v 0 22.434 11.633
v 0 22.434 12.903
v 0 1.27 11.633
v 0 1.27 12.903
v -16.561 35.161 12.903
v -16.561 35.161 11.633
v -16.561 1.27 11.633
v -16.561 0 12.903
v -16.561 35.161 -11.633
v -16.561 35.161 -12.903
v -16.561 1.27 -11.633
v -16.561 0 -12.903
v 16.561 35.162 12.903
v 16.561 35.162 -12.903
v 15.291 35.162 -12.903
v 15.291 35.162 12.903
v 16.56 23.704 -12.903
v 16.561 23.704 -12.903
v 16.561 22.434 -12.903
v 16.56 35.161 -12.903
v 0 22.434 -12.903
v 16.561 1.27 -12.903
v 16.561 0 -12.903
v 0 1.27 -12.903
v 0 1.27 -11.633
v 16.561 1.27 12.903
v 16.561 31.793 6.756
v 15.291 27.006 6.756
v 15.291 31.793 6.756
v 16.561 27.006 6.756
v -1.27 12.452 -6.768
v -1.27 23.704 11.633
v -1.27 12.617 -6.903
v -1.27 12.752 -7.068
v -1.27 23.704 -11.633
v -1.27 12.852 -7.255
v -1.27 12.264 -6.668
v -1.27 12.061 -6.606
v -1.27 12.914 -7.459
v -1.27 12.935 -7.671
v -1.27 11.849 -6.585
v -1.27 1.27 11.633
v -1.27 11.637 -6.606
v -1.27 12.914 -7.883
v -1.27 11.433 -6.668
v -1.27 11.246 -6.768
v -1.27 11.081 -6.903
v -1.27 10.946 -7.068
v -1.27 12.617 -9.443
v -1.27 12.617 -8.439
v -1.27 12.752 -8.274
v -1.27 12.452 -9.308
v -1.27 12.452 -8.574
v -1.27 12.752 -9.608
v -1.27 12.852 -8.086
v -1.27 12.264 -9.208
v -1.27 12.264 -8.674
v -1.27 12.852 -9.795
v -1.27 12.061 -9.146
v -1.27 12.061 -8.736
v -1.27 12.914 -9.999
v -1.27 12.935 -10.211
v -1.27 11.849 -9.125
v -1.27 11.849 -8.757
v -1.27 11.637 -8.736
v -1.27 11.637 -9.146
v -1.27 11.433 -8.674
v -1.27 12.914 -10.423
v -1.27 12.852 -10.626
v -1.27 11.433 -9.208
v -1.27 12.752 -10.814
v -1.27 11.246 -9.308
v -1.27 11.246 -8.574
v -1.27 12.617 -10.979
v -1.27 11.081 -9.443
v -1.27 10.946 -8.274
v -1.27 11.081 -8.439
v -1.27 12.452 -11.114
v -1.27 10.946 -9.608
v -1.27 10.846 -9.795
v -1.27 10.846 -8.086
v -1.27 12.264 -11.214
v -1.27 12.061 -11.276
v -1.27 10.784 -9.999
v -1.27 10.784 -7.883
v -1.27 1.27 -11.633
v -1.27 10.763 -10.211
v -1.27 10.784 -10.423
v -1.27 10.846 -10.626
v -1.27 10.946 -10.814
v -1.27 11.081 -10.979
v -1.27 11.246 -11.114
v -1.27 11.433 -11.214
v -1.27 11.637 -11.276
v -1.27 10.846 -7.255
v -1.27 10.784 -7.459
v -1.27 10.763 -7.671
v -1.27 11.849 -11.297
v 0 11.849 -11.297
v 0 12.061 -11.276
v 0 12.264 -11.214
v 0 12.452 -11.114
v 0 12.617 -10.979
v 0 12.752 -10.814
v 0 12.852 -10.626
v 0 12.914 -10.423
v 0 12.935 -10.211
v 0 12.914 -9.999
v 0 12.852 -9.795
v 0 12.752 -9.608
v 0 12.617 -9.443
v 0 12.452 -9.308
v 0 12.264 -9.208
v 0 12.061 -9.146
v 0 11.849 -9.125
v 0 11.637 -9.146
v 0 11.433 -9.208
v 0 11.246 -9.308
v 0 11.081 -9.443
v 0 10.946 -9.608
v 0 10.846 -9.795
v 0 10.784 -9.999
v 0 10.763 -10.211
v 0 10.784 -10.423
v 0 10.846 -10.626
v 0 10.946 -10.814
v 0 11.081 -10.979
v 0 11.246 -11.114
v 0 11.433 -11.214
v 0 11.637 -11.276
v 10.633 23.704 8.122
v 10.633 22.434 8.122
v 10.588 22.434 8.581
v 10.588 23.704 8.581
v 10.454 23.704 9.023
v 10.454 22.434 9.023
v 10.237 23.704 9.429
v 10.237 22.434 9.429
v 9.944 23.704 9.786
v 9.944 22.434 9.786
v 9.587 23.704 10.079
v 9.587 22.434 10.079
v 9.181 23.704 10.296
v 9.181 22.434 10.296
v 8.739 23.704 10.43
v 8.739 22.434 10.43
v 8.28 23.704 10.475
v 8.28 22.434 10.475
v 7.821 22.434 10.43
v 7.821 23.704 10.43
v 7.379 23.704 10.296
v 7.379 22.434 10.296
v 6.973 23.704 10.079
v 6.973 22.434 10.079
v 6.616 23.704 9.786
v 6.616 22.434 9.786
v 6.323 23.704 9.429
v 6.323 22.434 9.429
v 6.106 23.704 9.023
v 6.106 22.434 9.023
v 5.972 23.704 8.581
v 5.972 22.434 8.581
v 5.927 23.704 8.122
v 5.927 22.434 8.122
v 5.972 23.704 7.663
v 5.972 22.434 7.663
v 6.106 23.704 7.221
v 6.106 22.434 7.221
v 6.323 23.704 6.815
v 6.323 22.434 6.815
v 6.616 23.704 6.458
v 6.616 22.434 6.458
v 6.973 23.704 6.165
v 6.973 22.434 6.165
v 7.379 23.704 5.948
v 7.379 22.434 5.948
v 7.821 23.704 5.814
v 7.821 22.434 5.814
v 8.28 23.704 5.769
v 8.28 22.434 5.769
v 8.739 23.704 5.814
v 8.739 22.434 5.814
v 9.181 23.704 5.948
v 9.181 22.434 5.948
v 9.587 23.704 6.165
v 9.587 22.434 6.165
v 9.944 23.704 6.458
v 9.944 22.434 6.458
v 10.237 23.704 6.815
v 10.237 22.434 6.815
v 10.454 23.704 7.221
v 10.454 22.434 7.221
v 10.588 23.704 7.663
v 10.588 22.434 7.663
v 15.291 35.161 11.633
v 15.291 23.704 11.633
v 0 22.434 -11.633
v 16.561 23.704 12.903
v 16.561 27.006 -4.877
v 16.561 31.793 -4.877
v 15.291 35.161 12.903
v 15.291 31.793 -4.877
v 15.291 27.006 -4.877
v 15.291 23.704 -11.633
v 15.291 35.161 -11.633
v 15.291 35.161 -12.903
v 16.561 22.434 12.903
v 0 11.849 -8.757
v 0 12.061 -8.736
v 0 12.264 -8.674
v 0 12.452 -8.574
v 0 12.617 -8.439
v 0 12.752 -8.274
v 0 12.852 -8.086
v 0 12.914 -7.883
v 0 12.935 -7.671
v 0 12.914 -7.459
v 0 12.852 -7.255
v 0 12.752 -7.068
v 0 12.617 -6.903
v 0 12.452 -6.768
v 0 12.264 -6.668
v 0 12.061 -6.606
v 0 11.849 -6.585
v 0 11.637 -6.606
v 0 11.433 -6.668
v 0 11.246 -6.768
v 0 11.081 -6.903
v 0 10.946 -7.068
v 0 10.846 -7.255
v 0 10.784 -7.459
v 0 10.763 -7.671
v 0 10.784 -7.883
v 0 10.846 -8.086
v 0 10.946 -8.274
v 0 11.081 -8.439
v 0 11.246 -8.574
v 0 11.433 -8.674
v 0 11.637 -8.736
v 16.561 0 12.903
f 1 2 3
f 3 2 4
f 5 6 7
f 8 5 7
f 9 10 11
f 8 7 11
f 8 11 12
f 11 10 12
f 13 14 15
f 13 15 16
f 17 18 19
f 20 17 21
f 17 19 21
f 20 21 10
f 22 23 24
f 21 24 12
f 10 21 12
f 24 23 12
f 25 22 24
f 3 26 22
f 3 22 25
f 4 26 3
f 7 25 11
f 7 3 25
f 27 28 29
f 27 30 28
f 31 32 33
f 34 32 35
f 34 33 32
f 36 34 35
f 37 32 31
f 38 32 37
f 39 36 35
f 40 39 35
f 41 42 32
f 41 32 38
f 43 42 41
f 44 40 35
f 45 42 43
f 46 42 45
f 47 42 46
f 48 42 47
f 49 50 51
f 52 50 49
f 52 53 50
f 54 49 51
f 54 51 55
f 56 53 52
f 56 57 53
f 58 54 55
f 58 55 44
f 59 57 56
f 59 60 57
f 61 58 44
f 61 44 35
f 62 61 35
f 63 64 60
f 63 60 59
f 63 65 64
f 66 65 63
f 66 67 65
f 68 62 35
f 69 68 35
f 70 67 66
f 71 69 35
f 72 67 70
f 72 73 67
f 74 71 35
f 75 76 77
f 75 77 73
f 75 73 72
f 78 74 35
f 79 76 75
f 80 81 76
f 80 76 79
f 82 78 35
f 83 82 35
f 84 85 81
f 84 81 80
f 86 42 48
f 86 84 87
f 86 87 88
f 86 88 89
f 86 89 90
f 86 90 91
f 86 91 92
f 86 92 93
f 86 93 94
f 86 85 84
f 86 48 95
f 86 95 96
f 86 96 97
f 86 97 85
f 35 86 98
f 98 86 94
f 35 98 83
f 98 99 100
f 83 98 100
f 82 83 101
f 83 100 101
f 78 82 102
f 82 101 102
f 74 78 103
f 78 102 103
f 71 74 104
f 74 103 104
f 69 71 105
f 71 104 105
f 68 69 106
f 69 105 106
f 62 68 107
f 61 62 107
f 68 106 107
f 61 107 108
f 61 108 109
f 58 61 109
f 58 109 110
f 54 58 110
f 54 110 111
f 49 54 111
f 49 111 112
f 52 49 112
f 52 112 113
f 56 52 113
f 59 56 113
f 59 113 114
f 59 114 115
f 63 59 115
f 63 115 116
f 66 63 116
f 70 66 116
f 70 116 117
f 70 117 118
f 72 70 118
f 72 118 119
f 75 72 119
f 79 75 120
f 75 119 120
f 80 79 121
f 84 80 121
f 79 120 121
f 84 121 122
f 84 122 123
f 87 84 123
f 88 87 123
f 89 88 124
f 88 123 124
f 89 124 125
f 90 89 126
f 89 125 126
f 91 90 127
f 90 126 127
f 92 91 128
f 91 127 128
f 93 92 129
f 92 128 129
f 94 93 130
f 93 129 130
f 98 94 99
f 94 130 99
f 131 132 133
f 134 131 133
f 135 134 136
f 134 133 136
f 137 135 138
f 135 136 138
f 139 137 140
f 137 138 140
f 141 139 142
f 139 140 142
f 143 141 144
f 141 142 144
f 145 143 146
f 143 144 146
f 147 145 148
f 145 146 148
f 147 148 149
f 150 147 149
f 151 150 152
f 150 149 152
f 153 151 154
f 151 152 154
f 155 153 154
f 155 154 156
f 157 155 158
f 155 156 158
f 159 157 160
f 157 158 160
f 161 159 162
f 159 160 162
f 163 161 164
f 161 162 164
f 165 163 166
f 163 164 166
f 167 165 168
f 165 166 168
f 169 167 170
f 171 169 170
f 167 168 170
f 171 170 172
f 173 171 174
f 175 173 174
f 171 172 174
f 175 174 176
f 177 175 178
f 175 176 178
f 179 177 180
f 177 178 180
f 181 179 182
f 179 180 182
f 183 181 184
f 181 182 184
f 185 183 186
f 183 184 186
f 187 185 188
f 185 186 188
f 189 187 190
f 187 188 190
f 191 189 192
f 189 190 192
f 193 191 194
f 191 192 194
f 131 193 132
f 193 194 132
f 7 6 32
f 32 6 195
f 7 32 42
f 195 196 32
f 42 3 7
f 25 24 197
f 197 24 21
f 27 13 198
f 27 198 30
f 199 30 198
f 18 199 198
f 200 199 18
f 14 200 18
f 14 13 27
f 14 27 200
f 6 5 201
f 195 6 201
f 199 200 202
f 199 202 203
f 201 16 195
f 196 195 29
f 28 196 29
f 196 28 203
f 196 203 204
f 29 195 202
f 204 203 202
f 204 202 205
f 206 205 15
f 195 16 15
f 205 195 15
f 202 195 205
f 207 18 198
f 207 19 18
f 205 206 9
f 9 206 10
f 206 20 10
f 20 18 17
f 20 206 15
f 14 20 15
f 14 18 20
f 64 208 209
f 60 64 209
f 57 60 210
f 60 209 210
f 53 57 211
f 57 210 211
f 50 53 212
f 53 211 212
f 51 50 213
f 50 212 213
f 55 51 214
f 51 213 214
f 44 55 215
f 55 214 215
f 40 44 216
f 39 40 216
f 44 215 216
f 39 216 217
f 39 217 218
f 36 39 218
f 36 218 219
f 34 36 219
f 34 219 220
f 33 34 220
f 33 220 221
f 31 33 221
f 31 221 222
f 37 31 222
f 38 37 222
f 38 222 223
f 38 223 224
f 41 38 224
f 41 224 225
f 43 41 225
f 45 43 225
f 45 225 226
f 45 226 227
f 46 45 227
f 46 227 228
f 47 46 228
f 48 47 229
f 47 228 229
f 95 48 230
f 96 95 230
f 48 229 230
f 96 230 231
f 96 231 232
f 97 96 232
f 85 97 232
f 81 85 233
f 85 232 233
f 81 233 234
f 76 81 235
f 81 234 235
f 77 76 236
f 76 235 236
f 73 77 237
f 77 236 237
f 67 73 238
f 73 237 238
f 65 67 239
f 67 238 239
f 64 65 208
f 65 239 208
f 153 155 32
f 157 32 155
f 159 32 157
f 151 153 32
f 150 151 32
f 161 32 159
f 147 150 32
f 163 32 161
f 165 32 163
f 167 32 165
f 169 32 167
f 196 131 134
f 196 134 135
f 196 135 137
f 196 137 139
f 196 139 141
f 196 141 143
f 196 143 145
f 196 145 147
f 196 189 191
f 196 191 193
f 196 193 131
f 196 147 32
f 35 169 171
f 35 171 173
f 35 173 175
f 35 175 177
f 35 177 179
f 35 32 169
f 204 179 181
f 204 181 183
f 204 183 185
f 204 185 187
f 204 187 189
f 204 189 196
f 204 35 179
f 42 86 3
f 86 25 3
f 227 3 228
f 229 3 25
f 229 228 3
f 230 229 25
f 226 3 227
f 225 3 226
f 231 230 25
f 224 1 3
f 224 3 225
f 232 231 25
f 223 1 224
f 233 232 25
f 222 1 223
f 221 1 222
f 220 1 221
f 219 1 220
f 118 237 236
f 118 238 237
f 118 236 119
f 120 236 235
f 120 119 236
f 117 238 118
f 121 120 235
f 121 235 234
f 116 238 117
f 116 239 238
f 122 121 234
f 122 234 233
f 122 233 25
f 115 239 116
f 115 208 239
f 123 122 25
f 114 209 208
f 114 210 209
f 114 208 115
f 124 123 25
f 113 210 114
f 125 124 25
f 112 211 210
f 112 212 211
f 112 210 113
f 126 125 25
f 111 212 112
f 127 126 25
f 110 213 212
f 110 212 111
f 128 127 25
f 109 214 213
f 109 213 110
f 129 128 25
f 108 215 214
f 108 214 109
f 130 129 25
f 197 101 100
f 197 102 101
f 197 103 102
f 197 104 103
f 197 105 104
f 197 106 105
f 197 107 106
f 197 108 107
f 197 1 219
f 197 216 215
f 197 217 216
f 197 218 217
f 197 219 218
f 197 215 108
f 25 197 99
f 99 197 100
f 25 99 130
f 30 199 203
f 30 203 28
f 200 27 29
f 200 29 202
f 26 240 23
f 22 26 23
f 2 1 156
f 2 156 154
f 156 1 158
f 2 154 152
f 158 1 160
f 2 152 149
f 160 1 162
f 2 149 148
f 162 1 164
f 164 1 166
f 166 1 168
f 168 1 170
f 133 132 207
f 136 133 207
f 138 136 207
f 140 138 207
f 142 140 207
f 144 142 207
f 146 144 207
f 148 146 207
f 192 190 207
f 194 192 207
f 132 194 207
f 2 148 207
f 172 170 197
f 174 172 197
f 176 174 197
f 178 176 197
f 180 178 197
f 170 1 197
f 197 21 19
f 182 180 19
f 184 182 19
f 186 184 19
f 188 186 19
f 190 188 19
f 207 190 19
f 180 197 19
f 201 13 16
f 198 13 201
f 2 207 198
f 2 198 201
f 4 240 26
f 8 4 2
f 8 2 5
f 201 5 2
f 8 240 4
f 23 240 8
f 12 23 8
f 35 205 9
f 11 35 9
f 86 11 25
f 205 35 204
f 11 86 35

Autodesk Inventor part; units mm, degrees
ref_plane "YZ Plane" through (0, 0, 0) normal (1, 0, 0) x (0, 1, 0)
ref_plane "XZ Plane" through (0, 0, 0) normal (0, 1, 0) x (-1, 0, 0)
ref_plane "XY Plane" through (0, 0, 0) normal (0, 0, 1) x (1, 0, 0)
sketch "Boceto1" plane through (0, 0, 0) normal (0, 1, 0) x (-1, 0, 0)
  line L0 (-16.5612, -12.9032) -> (16.5612, -12.9032)
  line L1 (16.5612, -12.9032) -> (16.5612, 12.9032)
  line L2 (16.5612, 12.9032) -> (-16.5612, 12.9032)
  line L3 (-16.5612, 12.9032) -> (-16.5612, -12.9032)
  line L4 (-16.5612, -12.9032) -> (16.5612, 12.9032) construction
  line L5 (16.5612, -12.9032) -> (-16.5612, 12.9032) construction
  point P0 (0, 0)
  dimension "d0" = 16.5612
  dimension "d1" = 12.9032
extrude "Extrusión1" add sketch "Boceto1" along normal blind 1.27
sketch "Boceto2" plane through (-16.5612, 0, 12.9032) normal (0, 0, 1) x (1, 0, 0)
  line L0 (0, 1.27) -> (0, 35.1613)
  line L1 (0, 35.1613) -> (33.1216, 35.1613)
  line L2 (33.1216, 35.1613) -> (33.1216, 22.4613)
  line L3 (33.1216, 22.4613) -> (16.5608, 22.4613)
  line L4 (16.5608, 22.4613) -> (16.5612, 1.27)
  line L5 (33.1224, 1.27) -> (0, 1.27) projected
  point P0 (16.5612, 0)
  dimension "d4" = 33.1216
  dimension "d5" = 12.7
  dimension "d6" = 16.5608
  dimension "d7" = 21.1913
extrude "Extrusión2" add sketch "Boceto2" against normal blind 1.27
mirror "Simetría1" about plane through (0, 0, 0) normal (0, 0, 1) of "Extrusión2"
sketch "Boceto3" plane through (-0.0004, 22.4613, -11.6332) normal (1, 0, 0) x (0, 0, -1)
  line L0 (0, -21.191) -> (-23.2664, -21.191) projected
  line L1 (-23.2664, -21.191) -> (-23.2664, -0.0276)
  line L2 (-23.2664, -0.0276) -> (0, -0.0276)
  line L3 (0, 0) -> (0, -21.1913) projected
  line L4 (0, -0.0276) -> (0, -21.1913)
  line L5 (0, -21.1913) -> (-23.2664, -21.191)
  point P0 (-11.6332, -22.4613)
  dimension "d10" = 21.1634
extrude "Extrusión3" add sketch "Boceto3" against normal blind 1.27
sketch "Boceto4" plane through (-0.0004, 22.4337, 11.6332) normal (0, 1, 0) x (1, 0, 0)
  line L0 (16.561, 23.2664) -> (16.5608, 23.2664) projected
  line L1 (16.561, -1.27) -> (-1.2701, -1.27)
  line L2 (-1.27, 0) -> (-1.27, 23.2664) projected
  line L3 (-1.2701, -1.27) -> (-1.2701, 24.5364)
  line L4 (16.5612, 24.5364) -> (-16.5612, 24.5364) projected
  line L5 (-1.2701, 24.5364) -> (16.5612, 24.5364)
  line L6 (16.5612, 24.5364) -> (16.561, -1.27)
  dimension "d23" = 17.8312
extrude "Extrusión4" add sketch "Boceto4" along normal blind 1.27
sketch "Boceto7" plane through (16.5606, 22.434, 12.9032) normal (1, 0, 0) x (0, 0, -1)
  line L0 (0, 0) -> (25.8062, 0)
  line L1 (25.8062, -22.4334) -> (25.8062, 12.7279) projected
  line L2 (25.8062, 12.7279) -> (0, 12.7279)
  line L3 (0, 12.7279) -> (0, 0)
  line L4 (0, 1.27) -> (25.8064, 1.27) projected
  dimension "d28" = 1.27
  dimension "d29" = 25.8062
extrude "Extrusión7" add sketch "Boceto7" against normal blind 1.27
sketch "Boceto8" plane through (16.5606, 22.434, 12.9032) normal (1, 0, 0) x (0, 0, -1)
  line L0 (6.1467, 9.3592) -> (17.78, 9.3592)
  line L1 (17.78, 9.3592) -> (17.78, 4.572)
  line L2 (17.78, 4.572) -> (6.1467, 4.572)
  line L3 (6.1467, 4.572) -> (6.1467, 9.3592)
  line L4 (25.8064, 0) -> (0, 0) projected
  line L5 (0, 12.7273) -> (0, 1.27) projected
  point P0 (12.9031, -22.4337)
  dimension "d30" = 4.7871
  dimension "d31" = 11.6333
  dimension "d36" = 4.572
  dimension "d37" = 17.78
extrude "Extrusión8" cut sketch "Boceto8" against normal up to next
sketch "Boceto9" plane through (-0.0004, 22.4337, 11.6332) normal (0, -1, 0) x (1, 0, 0)
  circle A0 centre (8.2804, -3.5112) radius 2.3532
  line L0 (0, -24.5364) -> (0, 1.27) projected
  line L1 (15.291, 0) -> (-1.2701, 0) projected
  point P0 (0, -11.6332)
  dimension "d42" = 4.7064
  dimension "d43" = 8.2804
  dimension "d44" = 3.5112
extrude "Extrusión9" cut sketch "Boceto9" against normal up to next
sketch "Boceto10" plane through (0, 1.27, 12.9032) normal (1, 0, 0) x (0, 0, -1)
  circle A0 centre (23.114, 10.5788) radius 1.0858
  circle A1 centre (20.574, 10.5788) radius 1.0858
  line L0 (0, -0.0003) -> (25.8064, -0.0003) projected
  line L1 (0, 21.1637) -> (0, 0) projected
  point P0 (12.9032, -1.27)
  dimension "d47" = 2.1716
  dimension "d48" = 10.5791
  dimension "d49" = 23.114
  dimension "d50" = 2.54
  dimension "d51" = 10.5791
extrude "Extrusión10" cut sketch "Boceto10" against normal up to next
properties part number "sanicav"
